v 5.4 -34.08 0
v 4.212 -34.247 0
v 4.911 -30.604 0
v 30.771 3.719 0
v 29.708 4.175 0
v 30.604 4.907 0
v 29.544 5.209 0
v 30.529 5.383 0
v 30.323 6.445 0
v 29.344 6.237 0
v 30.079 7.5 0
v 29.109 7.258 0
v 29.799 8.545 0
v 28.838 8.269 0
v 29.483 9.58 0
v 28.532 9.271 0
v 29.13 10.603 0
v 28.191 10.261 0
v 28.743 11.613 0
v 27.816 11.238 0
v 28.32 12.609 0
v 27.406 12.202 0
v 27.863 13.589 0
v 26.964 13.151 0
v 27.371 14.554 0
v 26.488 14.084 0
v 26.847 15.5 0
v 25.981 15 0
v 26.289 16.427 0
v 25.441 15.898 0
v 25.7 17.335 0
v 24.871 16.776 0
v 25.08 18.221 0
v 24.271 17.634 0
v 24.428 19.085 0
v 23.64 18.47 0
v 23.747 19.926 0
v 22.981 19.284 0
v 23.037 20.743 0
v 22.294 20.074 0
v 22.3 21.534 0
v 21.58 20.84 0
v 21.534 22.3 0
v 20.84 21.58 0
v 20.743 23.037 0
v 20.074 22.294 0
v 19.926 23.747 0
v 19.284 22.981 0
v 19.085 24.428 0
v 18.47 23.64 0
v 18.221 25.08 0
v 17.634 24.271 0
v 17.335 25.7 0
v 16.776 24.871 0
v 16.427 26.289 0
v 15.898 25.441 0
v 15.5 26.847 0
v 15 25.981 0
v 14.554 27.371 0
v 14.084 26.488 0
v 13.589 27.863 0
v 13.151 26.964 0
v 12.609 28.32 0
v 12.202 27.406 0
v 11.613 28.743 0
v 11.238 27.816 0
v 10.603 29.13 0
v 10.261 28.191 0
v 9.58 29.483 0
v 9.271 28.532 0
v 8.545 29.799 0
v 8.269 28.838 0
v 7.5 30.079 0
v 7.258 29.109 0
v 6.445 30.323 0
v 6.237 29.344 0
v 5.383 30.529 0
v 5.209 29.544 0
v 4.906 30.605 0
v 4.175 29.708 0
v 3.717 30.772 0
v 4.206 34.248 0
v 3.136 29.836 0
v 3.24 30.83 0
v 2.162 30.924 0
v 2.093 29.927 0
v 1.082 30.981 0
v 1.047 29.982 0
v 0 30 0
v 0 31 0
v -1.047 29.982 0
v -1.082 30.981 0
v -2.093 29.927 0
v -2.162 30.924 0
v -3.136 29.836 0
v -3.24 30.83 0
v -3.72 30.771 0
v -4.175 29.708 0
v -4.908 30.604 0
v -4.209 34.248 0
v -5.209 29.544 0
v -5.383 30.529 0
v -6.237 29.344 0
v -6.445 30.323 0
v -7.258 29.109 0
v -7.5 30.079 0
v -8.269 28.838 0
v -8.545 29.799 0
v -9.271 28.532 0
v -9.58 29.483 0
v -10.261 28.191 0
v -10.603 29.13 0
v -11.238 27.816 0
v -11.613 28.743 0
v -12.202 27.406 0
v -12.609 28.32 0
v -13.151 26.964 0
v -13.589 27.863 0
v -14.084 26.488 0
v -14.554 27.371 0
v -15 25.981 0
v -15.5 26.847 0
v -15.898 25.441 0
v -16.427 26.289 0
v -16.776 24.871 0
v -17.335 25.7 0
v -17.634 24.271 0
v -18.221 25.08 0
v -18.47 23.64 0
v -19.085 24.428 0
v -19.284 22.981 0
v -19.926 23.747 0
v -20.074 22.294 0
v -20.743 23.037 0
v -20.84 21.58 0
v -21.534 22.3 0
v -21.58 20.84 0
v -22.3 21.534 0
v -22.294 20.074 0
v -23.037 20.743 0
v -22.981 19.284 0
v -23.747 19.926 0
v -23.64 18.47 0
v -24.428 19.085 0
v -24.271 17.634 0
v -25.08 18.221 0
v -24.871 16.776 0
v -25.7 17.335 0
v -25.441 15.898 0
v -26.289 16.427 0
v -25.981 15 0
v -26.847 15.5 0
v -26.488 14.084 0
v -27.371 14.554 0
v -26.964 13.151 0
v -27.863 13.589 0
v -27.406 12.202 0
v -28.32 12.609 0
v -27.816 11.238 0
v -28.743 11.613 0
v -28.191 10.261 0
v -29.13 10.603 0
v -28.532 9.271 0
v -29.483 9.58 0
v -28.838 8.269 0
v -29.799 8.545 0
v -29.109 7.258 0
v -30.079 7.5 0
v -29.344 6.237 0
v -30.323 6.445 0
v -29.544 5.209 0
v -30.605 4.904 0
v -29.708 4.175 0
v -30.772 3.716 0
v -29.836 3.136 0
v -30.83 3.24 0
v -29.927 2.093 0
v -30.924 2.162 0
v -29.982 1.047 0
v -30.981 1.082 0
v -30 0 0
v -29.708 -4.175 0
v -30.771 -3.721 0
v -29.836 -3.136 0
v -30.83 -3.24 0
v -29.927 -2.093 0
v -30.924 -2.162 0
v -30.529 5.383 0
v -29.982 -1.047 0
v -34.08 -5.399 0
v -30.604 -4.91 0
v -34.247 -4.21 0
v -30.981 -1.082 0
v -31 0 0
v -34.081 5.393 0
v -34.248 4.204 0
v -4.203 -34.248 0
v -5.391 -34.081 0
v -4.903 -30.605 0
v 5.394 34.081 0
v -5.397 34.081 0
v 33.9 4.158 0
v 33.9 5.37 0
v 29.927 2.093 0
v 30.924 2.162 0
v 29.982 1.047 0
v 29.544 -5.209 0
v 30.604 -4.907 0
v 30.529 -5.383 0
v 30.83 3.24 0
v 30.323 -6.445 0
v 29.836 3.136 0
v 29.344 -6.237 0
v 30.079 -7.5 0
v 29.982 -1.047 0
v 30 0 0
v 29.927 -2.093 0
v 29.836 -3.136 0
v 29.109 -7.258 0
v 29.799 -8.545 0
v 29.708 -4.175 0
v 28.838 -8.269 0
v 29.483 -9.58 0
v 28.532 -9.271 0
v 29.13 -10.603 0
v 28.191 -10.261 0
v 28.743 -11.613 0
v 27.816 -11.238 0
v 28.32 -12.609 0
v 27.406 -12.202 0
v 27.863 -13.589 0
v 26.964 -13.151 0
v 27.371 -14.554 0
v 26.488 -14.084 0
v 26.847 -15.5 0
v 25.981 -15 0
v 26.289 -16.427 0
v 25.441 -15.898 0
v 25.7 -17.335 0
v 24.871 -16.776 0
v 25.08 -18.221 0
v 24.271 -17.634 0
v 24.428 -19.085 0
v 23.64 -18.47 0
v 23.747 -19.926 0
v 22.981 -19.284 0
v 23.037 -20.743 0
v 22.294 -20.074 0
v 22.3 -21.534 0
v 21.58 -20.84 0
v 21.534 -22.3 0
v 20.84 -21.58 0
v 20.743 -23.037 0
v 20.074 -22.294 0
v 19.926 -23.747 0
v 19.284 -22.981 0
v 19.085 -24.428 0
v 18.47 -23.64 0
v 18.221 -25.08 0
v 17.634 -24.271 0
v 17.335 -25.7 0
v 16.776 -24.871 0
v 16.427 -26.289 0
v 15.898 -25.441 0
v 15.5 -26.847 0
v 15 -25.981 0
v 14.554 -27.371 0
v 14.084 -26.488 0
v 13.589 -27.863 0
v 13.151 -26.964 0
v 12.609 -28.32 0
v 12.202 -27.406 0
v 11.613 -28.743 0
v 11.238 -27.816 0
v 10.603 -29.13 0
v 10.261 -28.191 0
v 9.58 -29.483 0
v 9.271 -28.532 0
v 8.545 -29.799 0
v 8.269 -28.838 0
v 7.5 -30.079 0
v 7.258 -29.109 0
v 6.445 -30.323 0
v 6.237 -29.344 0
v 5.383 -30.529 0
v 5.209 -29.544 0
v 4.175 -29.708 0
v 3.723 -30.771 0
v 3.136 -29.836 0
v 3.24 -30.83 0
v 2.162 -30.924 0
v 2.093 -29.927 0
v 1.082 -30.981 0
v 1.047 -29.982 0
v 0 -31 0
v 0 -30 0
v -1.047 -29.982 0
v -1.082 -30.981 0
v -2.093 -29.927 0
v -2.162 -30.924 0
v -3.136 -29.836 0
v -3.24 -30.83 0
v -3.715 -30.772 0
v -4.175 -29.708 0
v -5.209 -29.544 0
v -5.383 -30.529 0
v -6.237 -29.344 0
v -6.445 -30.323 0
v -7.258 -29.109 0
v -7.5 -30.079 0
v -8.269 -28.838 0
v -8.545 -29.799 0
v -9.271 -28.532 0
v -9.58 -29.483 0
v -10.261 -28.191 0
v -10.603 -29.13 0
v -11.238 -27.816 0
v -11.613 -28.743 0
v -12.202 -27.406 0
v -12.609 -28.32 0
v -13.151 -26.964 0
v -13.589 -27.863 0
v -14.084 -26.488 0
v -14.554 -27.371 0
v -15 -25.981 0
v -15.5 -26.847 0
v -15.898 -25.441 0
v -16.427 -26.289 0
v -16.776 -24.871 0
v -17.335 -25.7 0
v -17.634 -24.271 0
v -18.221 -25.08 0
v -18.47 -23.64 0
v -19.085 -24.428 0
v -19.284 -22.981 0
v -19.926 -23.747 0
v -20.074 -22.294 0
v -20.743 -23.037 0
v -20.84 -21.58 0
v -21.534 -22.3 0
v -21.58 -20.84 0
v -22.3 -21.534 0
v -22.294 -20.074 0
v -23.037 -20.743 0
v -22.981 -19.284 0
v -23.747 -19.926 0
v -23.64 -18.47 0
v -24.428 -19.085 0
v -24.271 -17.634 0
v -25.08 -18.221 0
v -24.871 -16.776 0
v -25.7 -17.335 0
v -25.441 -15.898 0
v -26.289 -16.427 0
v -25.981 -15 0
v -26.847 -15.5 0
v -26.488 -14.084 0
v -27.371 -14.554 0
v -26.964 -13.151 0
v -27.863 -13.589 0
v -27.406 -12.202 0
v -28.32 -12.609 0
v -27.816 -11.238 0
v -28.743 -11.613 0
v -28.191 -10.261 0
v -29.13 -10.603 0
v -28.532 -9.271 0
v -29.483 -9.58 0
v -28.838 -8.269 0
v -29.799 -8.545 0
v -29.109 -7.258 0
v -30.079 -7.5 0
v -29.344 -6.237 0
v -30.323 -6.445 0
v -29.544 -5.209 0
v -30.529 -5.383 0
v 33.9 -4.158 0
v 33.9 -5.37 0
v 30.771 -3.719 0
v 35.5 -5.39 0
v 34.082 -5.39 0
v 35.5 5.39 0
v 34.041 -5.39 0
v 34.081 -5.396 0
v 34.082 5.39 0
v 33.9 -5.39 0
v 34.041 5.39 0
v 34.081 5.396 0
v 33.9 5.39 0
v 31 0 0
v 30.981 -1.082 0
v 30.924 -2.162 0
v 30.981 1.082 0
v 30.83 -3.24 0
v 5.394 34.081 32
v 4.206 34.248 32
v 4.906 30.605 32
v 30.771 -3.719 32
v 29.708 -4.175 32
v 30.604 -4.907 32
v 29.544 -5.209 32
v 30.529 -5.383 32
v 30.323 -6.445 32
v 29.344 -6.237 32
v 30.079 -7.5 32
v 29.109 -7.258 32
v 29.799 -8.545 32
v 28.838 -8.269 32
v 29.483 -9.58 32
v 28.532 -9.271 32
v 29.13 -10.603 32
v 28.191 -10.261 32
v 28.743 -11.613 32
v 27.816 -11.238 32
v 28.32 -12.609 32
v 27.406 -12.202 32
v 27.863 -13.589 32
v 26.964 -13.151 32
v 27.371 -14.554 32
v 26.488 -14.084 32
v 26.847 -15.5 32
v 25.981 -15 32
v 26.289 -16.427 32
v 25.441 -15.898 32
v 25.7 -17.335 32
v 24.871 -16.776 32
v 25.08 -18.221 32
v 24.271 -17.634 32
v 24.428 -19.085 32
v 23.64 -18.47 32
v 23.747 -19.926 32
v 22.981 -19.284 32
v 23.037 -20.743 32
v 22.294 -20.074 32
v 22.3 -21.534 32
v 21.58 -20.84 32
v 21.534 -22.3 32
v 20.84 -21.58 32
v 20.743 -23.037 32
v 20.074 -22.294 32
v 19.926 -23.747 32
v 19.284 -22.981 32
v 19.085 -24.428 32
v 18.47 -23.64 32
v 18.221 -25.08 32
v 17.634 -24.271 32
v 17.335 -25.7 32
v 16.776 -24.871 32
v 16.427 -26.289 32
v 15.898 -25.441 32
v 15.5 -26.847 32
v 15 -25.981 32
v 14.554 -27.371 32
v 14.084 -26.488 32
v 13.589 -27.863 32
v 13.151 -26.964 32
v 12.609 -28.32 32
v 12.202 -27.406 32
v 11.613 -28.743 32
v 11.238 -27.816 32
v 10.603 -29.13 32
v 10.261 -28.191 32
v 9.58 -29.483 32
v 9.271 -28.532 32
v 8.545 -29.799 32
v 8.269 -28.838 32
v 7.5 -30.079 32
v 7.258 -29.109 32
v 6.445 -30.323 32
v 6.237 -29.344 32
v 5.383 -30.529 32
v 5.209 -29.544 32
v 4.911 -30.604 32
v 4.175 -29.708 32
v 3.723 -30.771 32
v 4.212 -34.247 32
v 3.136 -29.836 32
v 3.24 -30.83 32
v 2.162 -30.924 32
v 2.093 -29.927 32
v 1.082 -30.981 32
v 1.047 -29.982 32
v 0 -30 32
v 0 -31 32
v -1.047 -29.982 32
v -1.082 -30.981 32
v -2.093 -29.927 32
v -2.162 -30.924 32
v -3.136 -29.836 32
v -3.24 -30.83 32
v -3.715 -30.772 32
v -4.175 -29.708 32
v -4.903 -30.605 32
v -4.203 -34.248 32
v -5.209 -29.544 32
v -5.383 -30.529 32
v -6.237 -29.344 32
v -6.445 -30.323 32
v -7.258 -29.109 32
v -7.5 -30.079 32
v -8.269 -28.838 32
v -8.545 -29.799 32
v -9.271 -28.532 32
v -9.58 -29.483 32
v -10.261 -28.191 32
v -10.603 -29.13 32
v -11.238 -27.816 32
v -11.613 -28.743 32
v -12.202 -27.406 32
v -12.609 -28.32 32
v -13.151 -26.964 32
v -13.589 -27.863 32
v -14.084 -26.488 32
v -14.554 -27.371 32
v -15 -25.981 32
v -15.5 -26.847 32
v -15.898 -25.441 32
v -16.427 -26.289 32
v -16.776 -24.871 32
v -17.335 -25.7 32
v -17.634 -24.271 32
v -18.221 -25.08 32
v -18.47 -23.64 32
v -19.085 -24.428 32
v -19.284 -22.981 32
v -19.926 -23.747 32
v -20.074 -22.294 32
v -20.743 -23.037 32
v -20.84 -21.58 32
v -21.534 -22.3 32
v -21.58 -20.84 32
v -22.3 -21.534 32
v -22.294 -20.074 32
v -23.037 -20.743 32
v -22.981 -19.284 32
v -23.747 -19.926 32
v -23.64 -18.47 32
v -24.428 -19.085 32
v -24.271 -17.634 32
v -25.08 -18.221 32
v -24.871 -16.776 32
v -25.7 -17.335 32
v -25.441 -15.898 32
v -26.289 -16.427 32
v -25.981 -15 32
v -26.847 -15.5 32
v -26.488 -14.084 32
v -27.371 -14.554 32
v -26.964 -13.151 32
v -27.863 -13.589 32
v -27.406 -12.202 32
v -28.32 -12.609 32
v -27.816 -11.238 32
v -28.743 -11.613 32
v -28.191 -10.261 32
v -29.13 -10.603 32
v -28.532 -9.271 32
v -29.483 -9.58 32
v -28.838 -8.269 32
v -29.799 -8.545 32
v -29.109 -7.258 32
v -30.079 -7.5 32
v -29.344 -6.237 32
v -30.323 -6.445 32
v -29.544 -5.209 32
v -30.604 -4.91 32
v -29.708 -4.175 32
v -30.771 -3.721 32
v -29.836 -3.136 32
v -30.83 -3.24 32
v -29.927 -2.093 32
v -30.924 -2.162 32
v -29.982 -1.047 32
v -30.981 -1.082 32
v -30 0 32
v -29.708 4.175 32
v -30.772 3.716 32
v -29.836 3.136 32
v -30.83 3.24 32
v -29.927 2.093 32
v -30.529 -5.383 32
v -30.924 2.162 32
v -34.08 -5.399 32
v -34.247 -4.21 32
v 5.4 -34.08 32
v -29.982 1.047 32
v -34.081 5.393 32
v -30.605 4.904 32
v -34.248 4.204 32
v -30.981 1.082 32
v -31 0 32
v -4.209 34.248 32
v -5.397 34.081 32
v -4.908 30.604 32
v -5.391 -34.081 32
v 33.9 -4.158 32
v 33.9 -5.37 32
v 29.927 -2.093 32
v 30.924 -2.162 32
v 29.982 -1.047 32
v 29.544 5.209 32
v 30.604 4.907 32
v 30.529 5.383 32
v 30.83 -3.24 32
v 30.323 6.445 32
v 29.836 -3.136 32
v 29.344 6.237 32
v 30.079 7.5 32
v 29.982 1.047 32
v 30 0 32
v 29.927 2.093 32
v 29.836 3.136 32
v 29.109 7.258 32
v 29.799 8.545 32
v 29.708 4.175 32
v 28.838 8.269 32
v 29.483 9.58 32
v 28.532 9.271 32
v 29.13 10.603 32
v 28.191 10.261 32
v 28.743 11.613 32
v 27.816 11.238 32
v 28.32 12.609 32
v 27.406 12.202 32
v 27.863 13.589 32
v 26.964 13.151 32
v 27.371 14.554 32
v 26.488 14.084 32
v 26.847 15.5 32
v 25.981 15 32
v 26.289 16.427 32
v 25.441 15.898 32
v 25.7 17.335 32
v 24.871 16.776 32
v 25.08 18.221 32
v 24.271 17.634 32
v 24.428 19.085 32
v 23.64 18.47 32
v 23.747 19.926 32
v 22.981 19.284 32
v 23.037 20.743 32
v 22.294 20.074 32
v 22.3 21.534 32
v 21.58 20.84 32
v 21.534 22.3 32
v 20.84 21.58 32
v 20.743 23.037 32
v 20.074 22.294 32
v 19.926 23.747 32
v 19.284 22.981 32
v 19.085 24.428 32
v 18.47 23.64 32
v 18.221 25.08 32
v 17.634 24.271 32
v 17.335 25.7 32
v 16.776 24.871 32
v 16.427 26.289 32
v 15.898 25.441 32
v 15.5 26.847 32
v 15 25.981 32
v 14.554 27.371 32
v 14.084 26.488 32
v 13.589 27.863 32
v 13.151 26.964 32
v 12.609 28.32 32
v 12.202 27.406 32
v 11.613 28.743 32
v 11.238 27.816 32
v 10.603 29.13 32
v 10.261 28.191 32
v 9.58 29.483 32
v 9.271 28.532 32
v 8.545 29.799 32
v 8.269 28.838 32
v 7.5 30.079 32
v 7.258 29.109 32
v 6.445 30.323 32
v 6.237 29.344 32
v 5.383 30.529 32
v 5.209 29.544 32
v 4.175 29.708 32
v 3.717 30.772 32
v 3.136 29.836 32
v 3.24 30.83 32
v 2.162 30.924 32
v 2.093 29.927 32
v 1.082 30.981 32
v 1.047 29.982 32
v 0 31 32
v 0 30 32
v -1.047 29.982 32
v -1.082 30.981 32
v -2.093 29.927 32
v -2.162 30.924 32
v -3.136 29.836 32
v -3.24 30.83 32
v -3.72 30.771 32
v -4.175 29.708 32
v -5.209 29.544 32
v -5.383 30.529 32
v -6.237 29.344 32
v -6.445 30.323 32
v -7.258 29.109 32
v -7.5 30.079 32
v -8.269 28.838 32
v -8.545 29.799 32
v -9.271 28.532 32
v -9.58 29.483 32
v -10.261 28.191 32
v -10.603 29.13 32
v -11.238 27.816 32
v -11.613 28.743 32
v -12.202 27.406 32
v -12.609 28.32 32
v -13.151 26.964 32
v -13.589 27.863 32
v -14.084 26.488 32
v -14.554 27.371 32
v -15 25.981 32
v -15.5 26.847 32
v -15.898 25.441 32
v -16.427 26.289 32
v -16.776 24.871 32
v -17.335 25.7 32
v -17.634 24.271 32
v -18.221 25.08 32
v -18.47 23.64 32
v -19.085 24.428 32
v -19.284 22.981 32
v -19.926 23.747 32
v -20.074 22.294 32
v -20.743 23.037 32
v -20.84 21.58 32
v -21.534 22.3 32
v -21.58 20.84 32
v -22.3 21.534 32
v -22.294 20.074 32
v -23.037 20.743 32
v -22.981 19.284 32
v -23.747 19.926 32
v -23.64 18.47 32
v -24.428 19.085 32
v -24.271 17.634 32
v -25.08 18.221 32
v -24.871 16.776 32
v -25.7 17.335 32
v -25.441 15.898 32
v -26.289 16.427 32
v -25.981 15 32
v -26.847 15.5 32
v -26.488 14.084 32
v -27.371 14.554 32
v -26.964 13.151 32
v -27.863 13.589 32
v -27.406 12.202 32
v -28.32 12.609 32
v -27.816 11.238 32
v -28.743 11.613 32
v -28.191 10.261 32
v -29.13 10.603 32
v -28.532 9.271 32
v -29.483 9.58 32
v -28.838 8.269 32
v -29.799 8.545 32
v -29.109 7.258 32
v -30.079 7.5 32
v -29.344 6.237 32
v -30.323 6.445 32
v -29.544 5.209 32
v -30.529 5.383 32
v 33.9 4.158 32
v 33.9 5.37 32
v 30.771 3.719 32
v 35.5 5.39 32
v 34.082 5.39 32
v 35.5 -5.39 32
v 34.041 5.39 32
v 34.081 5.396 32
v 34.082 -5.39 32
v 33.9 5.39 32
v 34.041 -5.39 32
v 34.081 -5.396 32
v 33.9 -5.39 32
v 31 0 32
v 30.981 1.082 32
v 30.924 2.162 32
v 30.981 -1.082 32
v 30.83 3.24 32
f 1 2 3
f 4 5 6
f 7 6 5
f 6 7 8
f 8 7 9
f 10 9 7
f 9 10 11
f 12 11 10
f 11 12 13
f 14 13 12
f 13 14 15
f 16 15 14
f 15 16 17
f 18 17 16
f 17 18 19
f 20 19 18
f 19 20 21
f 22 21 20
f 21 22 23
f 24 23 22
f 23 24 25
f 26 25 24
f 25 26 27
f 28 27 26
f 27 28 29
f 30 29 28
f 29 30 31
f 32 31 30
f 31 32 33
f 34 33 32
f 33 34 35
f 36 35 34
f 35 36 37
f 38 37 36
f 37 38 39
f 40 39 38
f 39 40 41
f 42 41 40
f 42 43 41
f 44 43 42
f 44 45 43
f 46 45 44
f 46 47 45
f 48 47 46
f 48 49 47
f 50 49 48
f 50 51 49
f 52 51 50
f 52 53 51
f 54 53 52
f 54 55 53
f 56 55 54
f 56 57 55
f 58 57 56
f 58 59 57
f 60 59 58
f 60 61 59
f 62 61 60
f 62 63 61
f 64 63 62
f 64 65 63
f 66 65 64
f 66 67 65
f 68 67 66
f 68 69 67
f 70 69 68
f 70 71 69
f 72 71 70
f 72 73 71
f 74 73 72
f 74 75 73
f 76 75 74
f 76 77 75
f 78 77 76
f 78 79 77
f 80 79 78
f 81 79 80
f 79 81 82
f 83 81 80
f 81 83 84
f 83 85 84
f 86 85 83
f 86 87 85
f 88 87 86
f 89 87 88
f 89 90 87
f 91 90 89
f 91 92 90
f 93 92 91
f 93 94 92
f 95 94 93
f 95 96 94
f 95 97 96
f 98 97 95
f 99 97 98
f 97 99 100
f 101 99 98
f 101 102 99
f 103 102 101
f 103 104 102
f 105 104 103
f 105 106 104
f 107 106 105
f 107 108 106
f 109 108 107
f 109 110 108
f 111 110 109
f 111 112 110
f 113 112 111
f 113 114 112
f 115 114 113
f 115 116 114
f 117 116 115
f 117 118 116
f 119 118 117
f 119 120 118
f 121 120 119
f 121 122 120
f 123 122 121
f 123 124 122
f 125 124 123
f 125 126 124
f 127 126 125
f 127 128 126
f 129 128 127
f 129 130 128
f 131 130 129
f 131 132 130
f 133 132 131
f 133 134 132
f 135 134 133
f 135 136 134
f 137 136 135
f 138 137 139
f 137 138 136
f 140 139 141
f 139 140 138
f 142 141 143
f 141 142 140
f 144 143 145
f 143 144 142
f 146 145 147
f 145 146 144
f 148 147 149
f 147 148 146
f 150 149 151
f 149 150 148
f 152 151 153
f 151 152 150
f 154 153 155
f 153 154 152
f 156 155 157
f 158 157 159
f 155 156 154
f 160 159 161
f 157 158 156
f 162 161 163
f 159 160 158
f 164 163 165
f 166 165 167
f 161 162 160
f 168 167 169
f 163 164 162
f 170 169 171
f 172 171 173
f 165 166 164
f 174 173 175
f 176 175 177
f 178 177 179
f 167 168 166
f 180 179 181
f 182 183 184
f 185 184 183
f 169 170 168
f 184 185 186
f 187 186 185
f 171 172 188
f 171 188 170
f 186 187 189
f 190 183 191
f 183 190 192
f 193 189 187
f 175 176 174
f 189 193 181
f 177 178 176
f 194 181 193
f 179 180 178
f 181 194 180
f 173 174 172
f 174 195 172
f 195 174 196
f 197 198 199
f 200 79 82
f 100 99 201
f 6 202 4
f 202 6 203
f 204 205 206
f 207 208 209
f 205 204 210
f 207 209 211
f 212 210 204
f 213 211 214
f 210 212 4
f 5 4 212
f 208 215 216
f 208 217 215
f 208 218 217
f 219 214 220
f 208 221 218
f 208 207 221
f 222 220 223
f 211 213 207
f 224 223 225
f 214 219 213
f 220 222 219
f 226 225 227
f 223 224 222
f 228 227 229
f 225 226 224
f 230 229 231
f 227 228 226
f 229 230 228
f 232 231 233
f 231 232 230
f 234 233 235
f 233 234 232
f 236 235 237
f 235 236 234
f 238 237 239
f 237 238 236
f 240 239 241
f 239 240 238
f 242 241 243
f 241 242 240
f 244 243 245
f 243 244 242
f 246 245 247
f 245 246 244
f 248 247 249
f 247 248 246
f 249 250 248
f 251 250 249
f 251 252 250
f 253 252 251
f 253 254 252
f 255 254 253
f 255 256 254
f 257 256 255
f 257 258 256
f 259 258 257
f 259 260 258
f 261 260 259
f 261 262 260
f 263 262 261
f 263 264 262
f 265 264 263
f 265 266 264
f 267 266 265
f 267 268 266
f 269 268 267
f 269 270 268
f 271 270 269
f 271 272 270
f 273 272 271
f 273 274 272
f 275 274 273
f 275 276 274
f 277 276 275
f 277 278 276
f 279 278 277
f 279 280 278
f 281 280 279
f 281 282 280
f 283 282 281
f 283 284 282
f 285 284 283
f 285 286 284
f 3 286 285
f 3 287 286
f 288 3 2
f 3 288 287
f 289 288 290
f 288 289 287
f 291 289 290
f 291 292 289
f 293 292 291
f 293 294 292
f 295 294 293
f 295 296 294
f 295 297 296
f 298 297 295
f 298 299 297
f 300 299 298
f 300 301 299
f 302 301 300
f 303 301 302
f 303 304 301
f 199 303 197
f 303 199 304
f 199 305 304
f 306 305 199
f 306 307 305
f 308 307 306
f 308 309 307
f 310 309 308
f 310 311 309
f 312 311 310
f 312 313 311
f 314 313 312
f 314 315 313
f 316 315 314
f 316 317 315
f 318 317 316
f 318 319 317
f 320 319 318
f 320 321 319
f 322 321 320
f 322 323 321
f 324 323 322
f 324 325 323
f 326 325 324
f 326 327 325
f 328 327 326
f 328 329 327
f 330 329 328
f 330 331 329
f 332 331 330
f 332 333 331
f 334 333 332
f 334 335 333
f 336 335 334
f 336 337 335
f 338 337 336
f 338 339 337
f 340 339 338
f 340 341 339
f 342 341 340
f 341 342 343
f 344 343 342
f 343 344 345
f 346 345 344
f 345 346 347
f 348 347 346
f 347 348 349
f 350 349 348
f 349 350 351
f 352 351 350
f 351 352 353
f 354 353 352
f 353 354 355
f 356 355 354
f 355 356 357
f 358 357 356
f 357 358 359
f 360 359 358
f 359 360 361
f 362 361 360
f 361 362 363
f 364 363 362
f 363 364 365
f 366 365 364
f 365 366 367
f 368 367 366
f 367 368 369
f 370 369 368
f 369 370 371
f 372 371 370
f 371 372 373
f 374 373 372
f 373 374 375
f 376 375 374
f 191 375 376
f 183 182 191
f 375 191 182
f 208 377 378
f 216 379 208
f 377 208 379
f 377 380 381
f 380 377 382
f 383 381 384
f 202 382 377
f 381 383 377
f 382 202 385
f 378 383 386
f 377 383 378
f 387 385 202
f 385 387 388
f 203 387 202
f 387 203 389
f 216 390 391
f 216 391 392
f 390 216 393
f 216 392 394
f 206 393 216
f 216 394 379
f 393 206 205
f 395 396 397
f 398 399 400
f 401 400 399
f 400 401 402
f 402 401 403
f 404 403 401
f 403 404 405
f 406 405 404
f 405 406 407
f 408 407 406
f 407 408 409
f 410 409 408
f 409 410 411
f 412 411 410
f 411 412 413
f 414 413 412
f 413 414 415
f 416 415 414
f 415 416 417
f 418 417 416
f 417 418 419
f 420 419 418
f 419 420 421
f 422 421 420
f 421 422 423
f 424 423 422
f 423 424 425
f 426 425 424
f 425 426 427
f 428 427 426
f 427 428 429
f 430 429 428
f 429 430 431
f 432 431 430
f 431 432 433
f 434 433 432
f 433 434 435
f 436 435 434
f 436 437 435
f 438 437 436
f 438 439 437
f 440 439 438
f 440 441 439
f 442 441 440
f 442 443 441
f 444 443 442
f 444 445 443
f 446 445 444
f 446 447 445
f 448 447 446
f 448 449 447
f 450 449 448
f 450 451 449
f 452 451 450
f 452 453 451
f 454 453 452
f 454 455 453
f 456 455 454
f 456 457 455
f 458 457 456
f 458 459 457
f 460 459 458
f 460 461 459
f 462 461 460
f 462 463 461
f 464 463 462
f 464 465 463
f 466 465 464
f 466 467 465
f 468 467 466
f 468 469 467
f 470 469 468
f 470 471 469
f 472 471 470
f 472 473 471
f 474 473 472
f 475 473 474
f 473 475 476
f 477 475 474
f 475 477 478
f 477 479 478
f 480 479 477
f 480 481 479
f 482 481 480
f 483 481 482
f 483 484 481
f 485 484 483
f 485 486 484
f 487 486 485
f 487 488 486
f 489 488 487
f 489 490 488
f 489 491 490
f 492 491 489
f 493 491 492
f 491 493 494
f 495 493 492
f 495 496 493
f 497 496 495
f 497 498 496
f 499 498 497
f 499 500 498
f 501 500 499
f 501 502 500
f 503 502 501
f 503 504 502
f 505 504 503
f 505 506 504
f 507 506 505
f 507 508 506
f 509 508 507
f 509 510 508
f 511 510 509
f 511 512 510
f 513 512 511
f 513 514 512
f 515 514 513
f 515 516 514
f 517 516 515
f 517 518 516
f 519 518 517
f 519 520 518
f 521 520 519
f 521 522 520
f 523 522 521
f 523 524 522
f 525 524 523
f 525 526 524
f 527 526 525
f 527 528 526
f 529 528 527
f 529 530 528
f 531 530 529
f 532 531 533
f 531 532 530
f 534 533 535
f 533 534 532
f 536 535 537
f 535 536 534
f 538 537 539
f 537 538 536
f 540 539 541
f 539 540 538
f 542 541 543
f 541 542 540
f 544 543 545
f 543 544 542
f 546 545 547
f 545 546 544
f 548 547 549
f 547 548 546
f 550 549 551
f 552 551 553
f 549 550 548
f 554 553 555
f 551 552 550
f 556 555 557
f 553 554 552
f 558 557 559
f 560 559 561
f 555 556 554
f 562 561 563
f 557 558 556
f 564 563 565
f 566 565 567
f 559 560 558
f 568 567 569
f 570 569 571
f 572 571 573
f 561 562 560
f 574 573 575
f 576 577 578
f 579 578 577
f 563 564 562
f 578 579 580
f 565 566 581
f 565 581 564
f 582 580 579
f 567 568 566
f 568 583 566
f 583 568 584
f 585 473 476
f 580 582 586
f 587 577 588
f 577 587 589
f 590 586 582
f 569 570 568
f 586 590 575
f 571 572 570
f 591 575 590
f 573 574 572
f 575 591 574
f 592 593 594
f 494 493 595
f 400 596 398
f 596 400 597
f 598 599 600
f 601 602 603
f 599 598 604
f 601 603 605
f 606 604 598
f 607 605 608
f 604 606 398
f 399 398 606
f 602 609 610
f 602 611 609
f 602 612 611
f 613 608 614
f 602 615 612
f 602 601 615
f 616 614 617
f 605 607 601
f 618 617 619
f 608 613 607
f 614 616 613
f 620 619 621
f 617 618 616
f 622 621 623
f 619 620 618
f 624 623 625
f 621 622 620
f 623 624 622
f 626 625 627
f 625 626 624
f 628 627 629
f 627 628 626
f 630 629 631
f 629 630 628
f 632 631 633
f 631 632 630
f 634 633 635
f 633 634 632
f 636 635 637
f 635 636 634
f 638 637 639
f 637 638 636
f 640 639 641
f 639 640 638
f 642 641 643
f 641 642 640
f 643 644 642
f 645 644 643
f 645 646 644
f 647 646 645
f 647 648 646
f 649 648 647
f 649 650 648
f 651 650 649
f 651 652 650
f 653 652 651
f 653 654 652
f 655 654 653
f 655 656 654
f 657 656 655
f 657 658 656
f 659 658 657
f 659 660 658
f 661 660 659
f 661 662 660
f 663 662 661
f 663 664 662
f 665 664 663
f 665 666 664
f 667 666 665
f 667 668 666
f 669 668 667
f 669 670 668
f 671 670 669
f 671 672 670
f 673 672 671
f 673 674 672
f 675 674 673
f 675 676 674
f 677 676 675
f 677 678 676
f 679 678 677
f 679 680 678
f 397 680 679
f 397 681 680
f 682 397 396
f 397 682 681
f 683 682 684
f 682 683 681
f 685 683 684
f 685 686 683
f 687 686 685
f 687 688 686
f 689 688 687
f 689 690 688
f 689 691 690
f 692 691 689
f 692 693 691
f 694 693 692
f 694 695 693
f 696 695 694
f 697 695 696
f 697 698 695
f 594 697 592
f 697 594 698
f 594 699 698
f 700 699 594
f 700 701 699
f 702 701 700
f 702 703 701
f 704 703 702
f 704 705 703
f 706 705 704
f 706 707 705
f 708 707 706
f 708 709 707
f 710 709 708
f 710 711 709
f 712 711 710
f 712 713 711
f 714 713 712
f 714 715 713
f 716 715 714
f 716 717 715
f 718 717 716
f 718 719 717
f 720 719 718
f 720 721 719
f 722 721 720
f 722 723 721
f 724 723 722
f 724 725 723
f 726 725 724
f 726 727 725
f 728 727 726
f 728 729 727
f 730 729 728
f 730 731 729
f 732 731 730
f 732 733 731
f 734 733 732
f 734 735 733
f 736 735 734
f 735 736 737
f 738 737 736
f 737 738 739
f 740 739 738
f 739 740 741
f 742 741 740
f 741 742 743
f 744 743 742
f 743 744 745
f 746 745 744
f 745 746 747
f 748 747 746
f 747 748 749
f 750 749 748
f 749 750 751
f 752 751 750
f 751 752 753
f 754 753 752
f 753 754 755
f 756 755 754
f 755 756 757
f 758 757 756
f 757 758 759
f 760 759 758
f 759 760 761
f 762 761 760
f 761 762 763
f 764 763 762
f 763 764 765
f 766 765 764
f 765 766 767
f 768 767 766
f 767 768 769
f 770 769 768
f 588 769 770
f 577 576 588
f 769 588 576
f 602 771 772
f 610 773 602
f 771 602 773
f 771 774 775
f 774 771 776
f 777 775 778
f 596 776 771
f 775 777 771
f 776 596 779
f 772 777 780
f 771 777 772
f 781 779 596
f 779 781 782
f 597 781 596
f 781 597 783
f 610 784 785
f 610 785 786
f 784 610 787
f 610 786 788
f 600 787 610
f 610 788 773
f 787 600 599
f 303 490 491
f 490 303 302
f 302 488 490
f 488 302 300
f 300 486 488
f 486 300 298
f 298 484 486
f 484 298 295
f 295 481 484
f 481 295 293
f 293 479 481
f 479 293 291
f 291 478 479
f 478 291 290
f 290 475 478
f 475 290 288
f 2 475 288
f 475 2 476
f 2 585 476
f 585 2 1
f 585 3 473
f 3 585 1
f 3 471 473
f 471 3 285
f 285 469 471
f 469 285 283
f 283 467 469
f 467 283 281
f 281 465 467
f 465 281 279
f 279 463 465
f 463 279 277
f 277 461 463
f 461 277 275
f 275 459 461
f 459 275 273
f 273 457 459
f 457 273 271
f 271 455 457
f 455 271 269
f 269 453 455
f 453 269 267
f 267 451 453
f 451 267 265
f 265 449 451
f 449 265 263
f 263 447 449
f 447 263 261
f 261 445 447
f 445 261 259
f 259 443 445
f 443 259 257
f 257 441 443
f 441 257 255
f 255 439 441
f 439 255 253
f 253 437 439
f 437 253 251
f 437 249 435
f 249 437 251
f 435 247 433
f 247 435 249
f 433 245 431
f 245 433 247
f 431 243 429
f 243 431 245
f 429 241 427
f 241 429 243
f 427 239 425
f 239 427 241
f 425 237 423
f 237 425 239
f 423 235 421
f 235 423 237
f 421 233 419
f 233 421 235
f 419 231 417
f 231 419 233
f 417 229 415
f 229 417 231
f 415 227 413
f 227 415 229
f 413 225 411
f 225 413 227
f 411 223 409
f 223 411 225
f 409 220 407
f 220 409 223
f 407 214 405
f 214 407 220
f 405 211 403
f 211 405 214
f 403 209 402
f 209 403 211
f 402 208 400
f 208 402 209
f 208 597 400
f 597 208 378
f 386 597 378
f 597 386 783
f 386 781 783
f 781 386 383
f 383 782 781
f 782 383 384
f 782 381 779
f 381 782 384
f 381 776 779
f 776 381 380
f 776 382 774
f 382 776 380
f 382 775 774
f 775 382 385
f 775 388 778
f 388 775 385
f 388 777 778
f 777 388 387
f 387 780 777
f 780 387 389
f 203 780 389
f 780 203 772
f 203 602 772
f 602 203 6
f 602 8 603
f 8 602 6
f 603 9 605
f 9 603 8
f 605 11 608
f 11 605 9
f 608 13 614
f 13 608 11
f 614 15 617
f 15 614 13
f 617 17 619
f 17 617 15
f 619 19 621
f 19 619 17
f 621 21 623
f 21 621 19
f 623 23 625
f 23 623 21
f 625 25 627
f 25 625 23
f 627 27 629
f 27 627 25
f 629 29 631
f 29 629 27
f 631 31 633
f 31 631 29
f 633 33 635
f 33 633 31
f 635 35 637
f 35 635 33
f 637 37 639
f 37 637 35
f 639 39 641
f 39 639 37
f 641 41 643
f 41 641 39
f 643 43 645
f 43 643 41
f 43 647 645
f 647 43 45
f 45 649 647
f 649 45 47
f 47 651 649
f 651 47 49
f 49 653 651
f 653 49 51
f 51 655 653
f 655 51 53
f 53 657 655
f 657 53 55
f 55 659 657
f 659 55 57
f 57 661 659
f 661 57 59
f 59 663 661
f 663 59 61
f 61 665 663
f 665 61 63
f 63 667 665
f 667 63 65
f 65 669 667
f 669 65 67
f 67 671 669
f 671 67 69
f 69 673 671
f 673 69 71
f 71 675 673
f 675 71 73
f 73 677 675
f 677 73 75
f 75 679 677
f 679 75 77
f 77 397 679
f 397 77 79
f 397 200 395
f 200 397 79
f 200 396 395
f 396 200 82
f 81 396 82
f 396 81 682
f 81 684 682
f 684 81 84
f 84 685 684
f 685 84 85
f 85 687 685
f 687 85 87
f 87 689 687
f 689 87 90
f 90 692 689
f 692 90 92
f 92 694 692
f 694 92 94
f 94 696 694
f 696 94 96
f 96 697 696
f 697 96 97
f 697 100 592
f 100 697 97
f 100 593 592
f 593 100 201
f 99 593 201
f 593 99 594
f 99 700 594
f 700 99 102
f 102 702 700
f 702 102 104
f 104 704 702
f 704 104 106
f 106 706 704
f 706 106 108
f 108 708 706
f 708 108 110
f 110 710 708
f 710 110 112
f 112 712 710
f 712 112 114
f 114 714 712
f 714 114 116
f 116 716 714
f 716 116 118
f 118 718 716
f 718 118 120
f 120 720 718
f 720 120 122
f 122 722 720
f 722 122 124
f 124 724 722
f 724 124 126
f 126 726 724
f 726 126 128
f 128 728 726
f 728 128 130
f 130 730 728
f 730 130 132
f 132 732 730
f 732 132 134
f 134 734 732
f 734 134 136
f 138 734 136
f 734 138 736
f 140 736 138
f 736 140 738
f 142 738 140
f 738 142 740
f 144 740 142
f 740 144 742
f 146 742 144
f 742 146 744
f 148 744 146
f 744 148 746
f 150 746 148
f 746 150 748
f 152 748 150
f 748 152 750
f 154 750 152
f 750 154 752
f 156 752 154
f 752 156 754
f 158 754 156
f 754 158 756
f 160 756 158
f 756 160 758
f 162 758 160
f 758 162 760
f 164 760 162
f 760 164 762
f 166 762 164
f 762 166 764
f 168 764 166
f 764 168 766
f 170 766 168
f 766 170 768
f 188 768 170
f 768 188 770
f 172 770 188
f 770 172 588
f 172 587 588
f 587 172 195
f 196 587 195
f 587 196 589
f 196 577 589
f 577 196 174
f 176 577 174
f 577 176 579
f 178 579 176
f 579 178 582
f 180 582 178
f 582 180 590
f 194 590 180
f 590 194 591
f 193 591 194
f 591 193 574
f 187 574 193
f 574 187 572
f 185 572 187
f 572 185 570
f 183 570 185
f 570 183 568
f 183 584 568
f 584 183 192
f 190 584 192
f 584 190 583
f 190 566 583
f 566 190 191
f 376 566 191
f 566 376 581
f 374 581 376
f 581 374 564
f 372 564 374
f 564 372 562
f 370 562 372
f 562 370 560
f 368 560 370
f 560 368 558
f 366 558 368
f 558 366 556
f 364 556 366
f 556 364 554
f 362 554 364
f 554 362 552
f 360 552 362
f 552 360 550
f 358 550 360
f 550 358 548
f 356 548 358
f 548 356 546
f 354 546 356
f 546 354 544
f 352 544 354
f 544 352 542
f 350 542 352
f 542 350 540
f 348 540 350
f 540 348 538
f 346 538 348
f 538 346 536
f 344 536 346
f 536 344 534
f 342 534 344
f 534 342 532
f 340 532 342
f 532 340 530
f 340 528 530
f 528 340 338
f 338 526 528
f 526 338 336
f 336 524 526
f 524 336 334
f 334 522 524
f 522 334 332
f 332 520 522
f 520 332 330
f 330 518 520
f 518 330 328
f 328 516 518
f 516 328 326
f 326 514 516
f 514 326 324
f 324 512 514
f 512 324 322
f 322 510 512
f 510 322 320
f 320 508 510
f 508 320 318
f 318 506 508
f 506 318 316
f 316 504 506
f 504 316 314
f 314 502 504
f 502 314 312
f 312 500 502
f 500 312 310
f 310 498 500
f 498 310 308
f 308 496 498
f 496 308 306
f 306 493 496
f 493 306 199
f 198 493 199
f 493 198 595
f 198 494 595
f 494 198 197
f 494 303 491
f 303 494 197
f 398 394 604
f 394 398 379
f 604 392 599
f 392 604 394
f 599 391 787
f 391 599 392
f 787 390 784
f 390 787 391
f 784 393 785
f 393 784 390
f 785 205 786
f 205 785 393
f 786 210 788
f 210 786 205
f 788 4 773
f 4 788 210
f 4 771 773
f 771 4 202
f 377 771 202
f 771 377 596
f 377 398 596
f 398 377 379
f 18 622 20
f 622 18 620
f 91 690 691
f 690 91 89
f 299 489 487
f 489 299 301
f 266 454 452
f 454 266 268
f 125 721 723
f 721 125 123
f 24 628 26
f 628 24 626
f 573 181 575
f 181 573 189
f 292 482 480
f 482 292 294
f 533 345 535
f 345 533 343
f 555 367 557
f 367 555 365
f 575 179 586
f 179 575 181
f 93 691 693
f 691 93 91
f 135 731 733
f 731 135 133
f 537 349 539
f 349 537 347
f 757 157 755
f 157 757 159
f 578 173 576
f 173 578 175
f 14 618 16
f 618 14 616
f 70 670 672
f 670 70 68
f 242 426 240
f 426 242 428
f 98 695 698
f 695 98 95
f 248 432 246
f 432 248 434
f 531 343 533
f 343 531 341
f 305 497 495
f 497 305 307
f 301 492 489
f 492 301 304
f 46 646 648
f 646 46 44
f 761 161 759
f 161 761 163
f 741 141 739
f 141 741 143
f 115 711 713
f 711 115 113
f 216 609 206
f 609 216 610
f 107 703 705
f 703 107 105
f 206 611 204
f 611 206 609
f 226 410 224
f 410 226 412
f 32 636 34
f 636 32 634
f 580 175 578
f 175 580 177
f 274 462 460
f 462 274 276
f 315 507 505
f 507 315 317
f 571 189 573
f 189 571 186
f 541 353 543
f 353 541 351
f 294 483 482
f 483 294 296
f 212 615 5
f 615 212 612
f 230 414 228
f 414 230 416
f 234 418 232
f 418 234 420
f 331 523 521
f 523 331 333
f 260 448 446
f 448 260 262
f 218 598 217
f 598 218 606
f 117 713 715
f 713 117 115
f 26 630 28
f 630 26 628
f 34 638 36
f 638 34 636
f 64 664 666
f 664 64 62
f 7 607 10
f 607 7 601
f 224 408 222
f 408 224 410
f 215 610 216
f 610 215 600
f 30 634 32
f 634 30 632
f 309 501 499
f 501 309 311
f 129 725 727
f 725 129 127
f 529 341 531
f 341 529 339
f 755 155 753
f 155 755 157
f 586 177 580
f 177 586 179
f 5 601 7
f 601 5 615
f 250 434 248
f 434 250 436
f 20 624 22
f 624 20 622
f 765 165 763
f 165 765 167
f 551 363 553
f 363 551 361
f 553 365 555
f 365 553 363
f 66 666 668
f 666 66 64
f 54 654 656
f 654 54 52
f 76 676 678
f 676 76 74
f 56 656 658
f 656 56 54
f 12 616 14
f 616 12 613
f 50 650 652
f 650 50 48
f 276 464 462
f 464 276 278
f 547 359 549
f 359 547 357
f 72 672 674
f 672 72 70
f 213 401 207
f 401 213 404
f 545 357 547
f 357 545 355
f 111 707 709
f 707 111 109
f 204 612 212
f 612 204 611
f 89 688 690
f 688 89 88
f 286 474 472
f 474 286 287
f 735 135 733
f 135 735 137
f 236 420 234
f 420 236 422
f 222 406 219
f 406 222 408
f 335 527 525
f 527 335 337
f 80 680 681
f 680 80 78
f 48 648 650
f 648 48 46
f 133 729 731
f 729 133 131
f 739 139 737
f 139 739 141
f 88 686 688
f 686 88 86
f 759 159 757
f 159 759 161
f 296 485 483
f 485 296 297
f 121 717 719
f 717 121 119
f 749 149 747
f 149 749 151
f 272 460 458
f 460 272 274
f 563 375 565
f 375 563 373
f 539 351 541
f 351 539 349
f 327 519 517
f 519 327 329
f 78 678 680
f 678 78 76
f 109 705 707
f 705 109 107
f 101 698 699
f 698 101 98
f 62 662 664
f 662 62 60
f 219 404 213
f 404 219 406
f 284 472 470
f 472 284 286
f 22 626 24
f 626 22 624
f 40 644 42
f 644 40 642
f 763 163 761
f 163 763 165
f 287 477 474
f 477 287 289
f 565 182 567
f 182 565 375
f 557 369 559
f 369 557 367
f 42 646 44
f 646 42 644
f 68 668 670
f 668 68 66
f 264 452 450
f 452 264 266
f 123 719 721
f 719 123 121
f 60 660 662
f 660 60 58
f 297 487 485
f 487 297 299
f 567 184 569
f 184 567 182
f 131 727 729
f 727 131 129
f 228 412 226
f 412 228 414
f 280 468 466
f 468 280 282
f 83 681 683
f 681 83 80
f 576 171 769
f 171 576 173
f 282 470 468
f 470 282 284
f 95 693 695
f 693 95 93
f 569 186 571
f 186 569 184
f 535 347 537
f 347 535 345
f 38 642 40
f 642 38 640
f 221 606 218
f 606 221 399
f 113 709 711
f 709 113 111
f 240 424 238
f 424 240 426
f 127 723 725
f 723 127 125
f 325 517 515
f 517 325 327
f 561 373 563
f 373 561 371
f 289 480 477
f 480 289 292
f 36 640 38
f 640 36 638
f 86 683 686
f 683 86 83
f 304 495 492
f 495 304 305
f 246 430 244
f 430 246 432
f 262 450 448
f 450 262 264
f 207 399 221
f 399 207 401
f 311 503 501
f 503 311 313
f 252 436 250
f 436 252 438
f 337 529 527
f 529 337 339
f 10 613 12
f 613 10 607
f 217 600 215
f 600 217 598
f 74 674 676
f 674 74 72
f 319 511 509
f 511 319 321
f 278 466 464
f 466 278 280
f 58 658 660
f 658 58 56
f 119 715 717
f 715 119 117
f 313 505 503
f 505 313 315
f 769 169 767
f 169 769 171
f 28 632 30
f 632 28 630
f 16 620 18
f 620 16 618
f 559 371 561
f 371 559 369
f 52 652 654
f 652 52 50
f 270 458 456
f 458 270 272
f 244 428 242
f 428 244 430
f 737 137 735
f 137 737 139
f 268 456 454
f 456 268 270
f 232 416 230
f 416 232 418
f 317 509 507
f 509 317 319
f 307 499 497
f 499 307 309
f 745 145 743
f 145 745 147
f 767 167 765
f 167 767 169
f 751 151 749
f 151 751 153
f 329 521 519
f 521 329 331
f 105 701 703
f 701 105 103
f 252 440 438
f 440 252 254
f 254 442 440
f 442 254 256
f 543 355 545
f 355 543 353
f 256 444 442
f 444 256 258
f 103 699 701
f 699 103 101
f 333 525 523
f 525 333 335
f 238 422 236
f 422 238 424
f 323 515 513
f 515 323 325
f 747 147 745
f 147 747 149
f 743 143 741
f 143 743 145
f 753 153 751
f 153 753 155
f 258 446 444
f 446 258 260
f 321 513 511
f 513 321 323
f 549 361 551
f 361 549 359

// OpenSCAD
// Wandhalterung fuer Licht-Fernbedienung - wall mount for RC
// Lampenhalterung fuer Deckenlampe und Stehlampe
// 
// 
// Background:
//   - immer verlegt man die Fernbedienung. Und wenn es dunkel im Raum
//     ist, dann sollte die Fernbedienung genau an der Wand 
//     neben dem Lichtschalter sein,
//     sonst findet man sie nicht, weil es ja dunkel ist ;-)
//   - Lampenfusshalterung: erlaubt, eine "Glocke" ueber die
//     Kabelanschluesse der Lampe zu schieben, die fest auf
//     dem Konus der Halterung klemmt. 
//   - Abdeckkappe fuer eine Verteilerdose, die zu nahe an der Wand ist.
//   - repository: https://github.com/Github6am/am_parts3D
//   - CAD manual: http://www.openscad.org/documentation.html
//
// Andreas Merz 2019-11-08, v0.4 
// GPLv3 or later, see http://www.gnu.org/licenses



// Main dimensions
xin=39.5;      // inner width,  width of RC
yin=15;        // inner width,  thickness of RC
zin=40;        // inner height
wall=1.2;      // wall thickness of printed part
clr=0.4;       // clearance

//-------------------------------------------
// drill
//-------------------------------------------

// cone+cylinder

module ccyl(h1=wall, h2=wall, r1=2, ang=-45, h3=yin+1) {
    ss=(r1-h2*tan(ang))/r1;
    rotate([-90,0,0]) translate([0,0,-0.01])
    union() {
      linear_extrude(height=h1, scale=1)  circle(r=r1,$fn=48);
      translate([0,0,h1])
        linear_extrude(height=h2, scale=ss) circle(r=r1, $fn=48);
      translate([0,0,h1+h2])
        linear_extrude(height=h3, scale=1) circle(r=r1*ss, $fn=48);
    }
}


//-------------------------------------------
// wall storage for remote controls (RC)
//-------------------------------------------
module Wandhalterung_2Dhalf() {
    r=2;             // chamfer inner radius
    w=wall;          // w: wall thickness
    x=xin/2;         // half RC width
    y=yin;           // inner y dimension, RC thickness
    t=(1-tan(45/2));
    // outer contour
    polygon( points=[
       // outer contour
       [0,0], [x+w, 0],
       [x+w, y+2*w-(r+w)*t], [x+w-(r+w)*t, y+2*w], [0, y+2*w],
       // inner contour
       [0, y+w], [x-r*t, y+w], [x, y+w-r*t], [x, 0+2*w], 
       [x-10, 0+2*w], [x-10, 0+2*w], [x-10, 0+w], [0, 0+w]
       ]);

}

module Wandhalterung_2D() {
  union() {
    Wandhalterung_2Dhalf();
    mirror([1,0,0]) 
    Wandhalterung_2Dhalf();
  }
}

module Wandhalterung_3D() {
  union() {
  linear_extrude(height = zin) Wandhalterung_2D();
  }
}

module Wandhalterung_A() {
  x=xin/2;         // half rc width
  difference() {
    union() {
      linear_extrude(height = zin) Wandhalterung_2D();
      linear_extrude(height = wall) hull() Wandhalterung_2D();
    }
    union() {
      translate([-(x-5),0,5+xin*1/2]) ccyl();
      translate([ (x-5),0,5+xin*1/2]) ccyl();
      // cut a hole in the bottom to prevent dirt accumulation
      translate([  0,yin/2+1,0]) cube([xin-10, yin-5, 3*wall], center=true);
    }
  }
}

//-------------------------------------------
// mount for Lightbulb socket connection cover
//-------------------------------------------

module Lampenfusshalterung(
    // Main dimensions
    rin=63.0/2,	   // radius
    hin=12,	   // inner height
    wall=0.8,	   // wall thickness of printed part
    rim=10,	   // rim width to mount
    cone=2.5	   // most covers have a slight conical shape, degrees
    ) {
      difference() {
        rotate([90,0,0])
	  ccyl(r1=rin, h1=2*wall, h2=hin, ang=cone, h3=0);
        union() {
	  translate([0,0,1.5*wall])
          rotate([90,0,0])
	    ccyl(r1=rin-wall, h1=2*wall, h2=hin, ang=cone, h3=0);
	  translate([0,0,-2*wall])
	    cylinder(r=rin-rim, h=8*wall, $fn=48);
	}
      }
}
    
module Lampenfusshalterung_A( 
    rmax=65, 
    hin=12,	   // inner height
    rim=10,	   //  inner mounting rim
    wall=0.8, 
    rin=63.0/2,	   // innerradius
    cone=2.5	   // most covers have a slight conical shape, degrees
    ) {
    bottom=3;      // bottom thickness at mounting rim
    step=(rmax-rin-wall)/3;
    difference() {
      union() {
	rotate_extrude($fn=96)
          // step or sawtooth like contour
	  polygon( points=[
	     // bottom contour
	     [rin-rim,0], [rmax,0],
	     [rmax,2],
	     // top contour
	     [rmax-0*step, 2], [rmax-1*step, 0.8],  // keep thin to avoid warping
	     [rmax-1*step, 4], [rmax-2*step, 1.9], 
	     [rmax-2*step, 6], [rmax-3*step, 3.0], 
	     [rin-rim, 3]
	     ]);
	translate([0,0,3])
          rotate([90,0,0])
	    ccyl(r1=rin, h1=2*wall, h2=hin, ang=cone, h3=0);
        }
	union() {
	  translate([0,0,bottom-0.1])
            rotate([90,0,0])
	      ccyl(r1=rin-wall, h1=2*wall+5-bottom, h2=hin+0.2, ang=cone, h3=0);
      }
    }
}


// zwei Verkleidungen fuer die Lampensockel der Wohnzimmerlampe

// erstere sollte ohne infill gedruckt werden, da die Waende so duenn sind.
module Lampenfusshalterung_B( 
    dd=42,   // inner diameter
    hh=42,   // height
    dx=0,    // excess,  for conical shape
    w=0.8    // wall thickness
    ) {
	difference() {
            cylinder(d1=dd+2*w, d2=dd+dx+2*w, h=hh,     $fn=180);
	  union() {
            translate([0,0,  w  ]) cylinder(d1=dd,     d2=dd+dx,   h=hh+0.2, $fn=180);
            translate([0,0, -0.1  ]) cylinder(d1=dd-2, d2=dd-2,    h=w +0.2, $fn=180);
	  }
	}
}

module Lampenfusshalterung_C( 
    dd0=28.4,  // inner diameter
    dd1=36,    // inner diameter of cone at beginning
    dd3=42,    // inner diameter of cone at end
    hh1=16,    // height
    hh3=36,    // height
    w=0.8      // wall thickness
    ) {
	dx=hh1/hh3*(dd3-dd1);
	difference() {
            cylinder(d1=dd1+2*w, d2=dd3+2*w, h=hh3,     $fn=180);
	  union() {
            translate([0,0,  hh1  ]) cylinder(d1=dd1+dx,  d2=dd3,   h=hh3+0.2-hh1, $fn=180);
            translate([0,0, -0.1  ]) cylinder(d1=dd0,     d2=dd0,   h=hh1+0.2,     $fn=180);
	  }
	}
}

//-------------------------------------------
// Abdeckkappe fuer elektrische Verteilerdose
//-------------------------------------------

module cut_circle_2D(
    r0=50,   // outer radius of circle
    r1=43,   // cut away, if r1<r0
    ) {
    difference() {
      circle(r=r0, $fn=180); 
      translate([r1,-r0,0]) square(2*r0);
    }
}

// TODO: Fase oder Aussenwand des Kreises kegelig machen?  
module distribution_box_cover(
    r0=45,   // outer radius of cover
    r1=18,   // cut away, if r1<r0
    di=9,    // inner diameter of inner rim
    hi=7,    // height of inner rim
    ho=4,    // height of outer rim
    w=1.6    // wall thickness
    ) {
    difference() {
      union() {
        // bottom and outer rim
        difference() {
          translate([0,0,0]) linear_extrude(height=ho) cut_circle_2D( r0=r0,   r1=r1);
          translate([0,0,w]) linear_extrude(height=ho) cut_circle_2D( r0=r0-w, r1=r1-w);
        }
        // inner rim
        difference() {
          translate([0,0,   0])   linear_extrude(height=w+hi) cut_circle_2D( r0=di/2+w, r1=r0);
          // set 1mm lower at inner for a tight fit at the outer rim
          translate([0,0,w+ho-1]) linear_extrude(height=hi  ) cut_circle_2D( r0=di/2,   r1=r0-w);
        }
      }
      // center bore hole for countersunk Spax screw
      translate([0,0,20]) rotate([-90,0,0])  ccyl(r1=2, h1=16, h2=4, ang=-30, h3=1);
    }
}
 

//-------------------------------------------
// Unterputzdose fuer Steckdosen
//-------------------------------------------

// Dose ohne Boden

module updoseA(
    da=69,   // standard wall bore hole diameter:68
    db=62,   // outer diameter
    dc=60,   // inner diameter
    dd=71,   // Dosendistanz bei Doppeldosen, typ: 71
    zz=32,   // height
    ww=1.2,  // wall thickness
    nn=4     // number of fin pairs
    ) {
    difference() {
      linear_extrude(height=zz)
      union() { 
        circle(r=db/2, $fn=180);
        for (i = [0 : nn-1]) {
	  rotate([0, 0, 360.01/nn*i +8]) translate([(db+dc)/4,-ww/2]) square( [da/2 -(db+dc)/4, ww]);
	  rotate([0, 0, 360.01/nn*i -8]) translate([(db+dc)/4,-ww/2]) square( [da/2 -(db+dc)/4, ww]);
        }
        if(dd > da) {
          xsq=(dd-da)/2;
          ysq=10.78;      // Augenschein, nicht gerechnet.
          translate([dd/2-xsq-0.6, -ysq/2]) square( [xsq+0.6, ysq]);
        }
      }
      // Innenraum
      translate([0,0,-1]) cylinder(d=dc, h=zz+2, $fn=180); 
    }
}



//------------- Instances --------------------
// test
//rotate([90,0,0]) ccyl(r1=20, h1=10, h2=5, ang=30, h3=0);


//Wandhalterung_A();
//Lampenfusshalterung();
//Lampenfusshalterung_A();
//Lampenfusshalterung_B();
//Lampenfusshalterung_C();
//distribution_box_cover();

updoseA();
